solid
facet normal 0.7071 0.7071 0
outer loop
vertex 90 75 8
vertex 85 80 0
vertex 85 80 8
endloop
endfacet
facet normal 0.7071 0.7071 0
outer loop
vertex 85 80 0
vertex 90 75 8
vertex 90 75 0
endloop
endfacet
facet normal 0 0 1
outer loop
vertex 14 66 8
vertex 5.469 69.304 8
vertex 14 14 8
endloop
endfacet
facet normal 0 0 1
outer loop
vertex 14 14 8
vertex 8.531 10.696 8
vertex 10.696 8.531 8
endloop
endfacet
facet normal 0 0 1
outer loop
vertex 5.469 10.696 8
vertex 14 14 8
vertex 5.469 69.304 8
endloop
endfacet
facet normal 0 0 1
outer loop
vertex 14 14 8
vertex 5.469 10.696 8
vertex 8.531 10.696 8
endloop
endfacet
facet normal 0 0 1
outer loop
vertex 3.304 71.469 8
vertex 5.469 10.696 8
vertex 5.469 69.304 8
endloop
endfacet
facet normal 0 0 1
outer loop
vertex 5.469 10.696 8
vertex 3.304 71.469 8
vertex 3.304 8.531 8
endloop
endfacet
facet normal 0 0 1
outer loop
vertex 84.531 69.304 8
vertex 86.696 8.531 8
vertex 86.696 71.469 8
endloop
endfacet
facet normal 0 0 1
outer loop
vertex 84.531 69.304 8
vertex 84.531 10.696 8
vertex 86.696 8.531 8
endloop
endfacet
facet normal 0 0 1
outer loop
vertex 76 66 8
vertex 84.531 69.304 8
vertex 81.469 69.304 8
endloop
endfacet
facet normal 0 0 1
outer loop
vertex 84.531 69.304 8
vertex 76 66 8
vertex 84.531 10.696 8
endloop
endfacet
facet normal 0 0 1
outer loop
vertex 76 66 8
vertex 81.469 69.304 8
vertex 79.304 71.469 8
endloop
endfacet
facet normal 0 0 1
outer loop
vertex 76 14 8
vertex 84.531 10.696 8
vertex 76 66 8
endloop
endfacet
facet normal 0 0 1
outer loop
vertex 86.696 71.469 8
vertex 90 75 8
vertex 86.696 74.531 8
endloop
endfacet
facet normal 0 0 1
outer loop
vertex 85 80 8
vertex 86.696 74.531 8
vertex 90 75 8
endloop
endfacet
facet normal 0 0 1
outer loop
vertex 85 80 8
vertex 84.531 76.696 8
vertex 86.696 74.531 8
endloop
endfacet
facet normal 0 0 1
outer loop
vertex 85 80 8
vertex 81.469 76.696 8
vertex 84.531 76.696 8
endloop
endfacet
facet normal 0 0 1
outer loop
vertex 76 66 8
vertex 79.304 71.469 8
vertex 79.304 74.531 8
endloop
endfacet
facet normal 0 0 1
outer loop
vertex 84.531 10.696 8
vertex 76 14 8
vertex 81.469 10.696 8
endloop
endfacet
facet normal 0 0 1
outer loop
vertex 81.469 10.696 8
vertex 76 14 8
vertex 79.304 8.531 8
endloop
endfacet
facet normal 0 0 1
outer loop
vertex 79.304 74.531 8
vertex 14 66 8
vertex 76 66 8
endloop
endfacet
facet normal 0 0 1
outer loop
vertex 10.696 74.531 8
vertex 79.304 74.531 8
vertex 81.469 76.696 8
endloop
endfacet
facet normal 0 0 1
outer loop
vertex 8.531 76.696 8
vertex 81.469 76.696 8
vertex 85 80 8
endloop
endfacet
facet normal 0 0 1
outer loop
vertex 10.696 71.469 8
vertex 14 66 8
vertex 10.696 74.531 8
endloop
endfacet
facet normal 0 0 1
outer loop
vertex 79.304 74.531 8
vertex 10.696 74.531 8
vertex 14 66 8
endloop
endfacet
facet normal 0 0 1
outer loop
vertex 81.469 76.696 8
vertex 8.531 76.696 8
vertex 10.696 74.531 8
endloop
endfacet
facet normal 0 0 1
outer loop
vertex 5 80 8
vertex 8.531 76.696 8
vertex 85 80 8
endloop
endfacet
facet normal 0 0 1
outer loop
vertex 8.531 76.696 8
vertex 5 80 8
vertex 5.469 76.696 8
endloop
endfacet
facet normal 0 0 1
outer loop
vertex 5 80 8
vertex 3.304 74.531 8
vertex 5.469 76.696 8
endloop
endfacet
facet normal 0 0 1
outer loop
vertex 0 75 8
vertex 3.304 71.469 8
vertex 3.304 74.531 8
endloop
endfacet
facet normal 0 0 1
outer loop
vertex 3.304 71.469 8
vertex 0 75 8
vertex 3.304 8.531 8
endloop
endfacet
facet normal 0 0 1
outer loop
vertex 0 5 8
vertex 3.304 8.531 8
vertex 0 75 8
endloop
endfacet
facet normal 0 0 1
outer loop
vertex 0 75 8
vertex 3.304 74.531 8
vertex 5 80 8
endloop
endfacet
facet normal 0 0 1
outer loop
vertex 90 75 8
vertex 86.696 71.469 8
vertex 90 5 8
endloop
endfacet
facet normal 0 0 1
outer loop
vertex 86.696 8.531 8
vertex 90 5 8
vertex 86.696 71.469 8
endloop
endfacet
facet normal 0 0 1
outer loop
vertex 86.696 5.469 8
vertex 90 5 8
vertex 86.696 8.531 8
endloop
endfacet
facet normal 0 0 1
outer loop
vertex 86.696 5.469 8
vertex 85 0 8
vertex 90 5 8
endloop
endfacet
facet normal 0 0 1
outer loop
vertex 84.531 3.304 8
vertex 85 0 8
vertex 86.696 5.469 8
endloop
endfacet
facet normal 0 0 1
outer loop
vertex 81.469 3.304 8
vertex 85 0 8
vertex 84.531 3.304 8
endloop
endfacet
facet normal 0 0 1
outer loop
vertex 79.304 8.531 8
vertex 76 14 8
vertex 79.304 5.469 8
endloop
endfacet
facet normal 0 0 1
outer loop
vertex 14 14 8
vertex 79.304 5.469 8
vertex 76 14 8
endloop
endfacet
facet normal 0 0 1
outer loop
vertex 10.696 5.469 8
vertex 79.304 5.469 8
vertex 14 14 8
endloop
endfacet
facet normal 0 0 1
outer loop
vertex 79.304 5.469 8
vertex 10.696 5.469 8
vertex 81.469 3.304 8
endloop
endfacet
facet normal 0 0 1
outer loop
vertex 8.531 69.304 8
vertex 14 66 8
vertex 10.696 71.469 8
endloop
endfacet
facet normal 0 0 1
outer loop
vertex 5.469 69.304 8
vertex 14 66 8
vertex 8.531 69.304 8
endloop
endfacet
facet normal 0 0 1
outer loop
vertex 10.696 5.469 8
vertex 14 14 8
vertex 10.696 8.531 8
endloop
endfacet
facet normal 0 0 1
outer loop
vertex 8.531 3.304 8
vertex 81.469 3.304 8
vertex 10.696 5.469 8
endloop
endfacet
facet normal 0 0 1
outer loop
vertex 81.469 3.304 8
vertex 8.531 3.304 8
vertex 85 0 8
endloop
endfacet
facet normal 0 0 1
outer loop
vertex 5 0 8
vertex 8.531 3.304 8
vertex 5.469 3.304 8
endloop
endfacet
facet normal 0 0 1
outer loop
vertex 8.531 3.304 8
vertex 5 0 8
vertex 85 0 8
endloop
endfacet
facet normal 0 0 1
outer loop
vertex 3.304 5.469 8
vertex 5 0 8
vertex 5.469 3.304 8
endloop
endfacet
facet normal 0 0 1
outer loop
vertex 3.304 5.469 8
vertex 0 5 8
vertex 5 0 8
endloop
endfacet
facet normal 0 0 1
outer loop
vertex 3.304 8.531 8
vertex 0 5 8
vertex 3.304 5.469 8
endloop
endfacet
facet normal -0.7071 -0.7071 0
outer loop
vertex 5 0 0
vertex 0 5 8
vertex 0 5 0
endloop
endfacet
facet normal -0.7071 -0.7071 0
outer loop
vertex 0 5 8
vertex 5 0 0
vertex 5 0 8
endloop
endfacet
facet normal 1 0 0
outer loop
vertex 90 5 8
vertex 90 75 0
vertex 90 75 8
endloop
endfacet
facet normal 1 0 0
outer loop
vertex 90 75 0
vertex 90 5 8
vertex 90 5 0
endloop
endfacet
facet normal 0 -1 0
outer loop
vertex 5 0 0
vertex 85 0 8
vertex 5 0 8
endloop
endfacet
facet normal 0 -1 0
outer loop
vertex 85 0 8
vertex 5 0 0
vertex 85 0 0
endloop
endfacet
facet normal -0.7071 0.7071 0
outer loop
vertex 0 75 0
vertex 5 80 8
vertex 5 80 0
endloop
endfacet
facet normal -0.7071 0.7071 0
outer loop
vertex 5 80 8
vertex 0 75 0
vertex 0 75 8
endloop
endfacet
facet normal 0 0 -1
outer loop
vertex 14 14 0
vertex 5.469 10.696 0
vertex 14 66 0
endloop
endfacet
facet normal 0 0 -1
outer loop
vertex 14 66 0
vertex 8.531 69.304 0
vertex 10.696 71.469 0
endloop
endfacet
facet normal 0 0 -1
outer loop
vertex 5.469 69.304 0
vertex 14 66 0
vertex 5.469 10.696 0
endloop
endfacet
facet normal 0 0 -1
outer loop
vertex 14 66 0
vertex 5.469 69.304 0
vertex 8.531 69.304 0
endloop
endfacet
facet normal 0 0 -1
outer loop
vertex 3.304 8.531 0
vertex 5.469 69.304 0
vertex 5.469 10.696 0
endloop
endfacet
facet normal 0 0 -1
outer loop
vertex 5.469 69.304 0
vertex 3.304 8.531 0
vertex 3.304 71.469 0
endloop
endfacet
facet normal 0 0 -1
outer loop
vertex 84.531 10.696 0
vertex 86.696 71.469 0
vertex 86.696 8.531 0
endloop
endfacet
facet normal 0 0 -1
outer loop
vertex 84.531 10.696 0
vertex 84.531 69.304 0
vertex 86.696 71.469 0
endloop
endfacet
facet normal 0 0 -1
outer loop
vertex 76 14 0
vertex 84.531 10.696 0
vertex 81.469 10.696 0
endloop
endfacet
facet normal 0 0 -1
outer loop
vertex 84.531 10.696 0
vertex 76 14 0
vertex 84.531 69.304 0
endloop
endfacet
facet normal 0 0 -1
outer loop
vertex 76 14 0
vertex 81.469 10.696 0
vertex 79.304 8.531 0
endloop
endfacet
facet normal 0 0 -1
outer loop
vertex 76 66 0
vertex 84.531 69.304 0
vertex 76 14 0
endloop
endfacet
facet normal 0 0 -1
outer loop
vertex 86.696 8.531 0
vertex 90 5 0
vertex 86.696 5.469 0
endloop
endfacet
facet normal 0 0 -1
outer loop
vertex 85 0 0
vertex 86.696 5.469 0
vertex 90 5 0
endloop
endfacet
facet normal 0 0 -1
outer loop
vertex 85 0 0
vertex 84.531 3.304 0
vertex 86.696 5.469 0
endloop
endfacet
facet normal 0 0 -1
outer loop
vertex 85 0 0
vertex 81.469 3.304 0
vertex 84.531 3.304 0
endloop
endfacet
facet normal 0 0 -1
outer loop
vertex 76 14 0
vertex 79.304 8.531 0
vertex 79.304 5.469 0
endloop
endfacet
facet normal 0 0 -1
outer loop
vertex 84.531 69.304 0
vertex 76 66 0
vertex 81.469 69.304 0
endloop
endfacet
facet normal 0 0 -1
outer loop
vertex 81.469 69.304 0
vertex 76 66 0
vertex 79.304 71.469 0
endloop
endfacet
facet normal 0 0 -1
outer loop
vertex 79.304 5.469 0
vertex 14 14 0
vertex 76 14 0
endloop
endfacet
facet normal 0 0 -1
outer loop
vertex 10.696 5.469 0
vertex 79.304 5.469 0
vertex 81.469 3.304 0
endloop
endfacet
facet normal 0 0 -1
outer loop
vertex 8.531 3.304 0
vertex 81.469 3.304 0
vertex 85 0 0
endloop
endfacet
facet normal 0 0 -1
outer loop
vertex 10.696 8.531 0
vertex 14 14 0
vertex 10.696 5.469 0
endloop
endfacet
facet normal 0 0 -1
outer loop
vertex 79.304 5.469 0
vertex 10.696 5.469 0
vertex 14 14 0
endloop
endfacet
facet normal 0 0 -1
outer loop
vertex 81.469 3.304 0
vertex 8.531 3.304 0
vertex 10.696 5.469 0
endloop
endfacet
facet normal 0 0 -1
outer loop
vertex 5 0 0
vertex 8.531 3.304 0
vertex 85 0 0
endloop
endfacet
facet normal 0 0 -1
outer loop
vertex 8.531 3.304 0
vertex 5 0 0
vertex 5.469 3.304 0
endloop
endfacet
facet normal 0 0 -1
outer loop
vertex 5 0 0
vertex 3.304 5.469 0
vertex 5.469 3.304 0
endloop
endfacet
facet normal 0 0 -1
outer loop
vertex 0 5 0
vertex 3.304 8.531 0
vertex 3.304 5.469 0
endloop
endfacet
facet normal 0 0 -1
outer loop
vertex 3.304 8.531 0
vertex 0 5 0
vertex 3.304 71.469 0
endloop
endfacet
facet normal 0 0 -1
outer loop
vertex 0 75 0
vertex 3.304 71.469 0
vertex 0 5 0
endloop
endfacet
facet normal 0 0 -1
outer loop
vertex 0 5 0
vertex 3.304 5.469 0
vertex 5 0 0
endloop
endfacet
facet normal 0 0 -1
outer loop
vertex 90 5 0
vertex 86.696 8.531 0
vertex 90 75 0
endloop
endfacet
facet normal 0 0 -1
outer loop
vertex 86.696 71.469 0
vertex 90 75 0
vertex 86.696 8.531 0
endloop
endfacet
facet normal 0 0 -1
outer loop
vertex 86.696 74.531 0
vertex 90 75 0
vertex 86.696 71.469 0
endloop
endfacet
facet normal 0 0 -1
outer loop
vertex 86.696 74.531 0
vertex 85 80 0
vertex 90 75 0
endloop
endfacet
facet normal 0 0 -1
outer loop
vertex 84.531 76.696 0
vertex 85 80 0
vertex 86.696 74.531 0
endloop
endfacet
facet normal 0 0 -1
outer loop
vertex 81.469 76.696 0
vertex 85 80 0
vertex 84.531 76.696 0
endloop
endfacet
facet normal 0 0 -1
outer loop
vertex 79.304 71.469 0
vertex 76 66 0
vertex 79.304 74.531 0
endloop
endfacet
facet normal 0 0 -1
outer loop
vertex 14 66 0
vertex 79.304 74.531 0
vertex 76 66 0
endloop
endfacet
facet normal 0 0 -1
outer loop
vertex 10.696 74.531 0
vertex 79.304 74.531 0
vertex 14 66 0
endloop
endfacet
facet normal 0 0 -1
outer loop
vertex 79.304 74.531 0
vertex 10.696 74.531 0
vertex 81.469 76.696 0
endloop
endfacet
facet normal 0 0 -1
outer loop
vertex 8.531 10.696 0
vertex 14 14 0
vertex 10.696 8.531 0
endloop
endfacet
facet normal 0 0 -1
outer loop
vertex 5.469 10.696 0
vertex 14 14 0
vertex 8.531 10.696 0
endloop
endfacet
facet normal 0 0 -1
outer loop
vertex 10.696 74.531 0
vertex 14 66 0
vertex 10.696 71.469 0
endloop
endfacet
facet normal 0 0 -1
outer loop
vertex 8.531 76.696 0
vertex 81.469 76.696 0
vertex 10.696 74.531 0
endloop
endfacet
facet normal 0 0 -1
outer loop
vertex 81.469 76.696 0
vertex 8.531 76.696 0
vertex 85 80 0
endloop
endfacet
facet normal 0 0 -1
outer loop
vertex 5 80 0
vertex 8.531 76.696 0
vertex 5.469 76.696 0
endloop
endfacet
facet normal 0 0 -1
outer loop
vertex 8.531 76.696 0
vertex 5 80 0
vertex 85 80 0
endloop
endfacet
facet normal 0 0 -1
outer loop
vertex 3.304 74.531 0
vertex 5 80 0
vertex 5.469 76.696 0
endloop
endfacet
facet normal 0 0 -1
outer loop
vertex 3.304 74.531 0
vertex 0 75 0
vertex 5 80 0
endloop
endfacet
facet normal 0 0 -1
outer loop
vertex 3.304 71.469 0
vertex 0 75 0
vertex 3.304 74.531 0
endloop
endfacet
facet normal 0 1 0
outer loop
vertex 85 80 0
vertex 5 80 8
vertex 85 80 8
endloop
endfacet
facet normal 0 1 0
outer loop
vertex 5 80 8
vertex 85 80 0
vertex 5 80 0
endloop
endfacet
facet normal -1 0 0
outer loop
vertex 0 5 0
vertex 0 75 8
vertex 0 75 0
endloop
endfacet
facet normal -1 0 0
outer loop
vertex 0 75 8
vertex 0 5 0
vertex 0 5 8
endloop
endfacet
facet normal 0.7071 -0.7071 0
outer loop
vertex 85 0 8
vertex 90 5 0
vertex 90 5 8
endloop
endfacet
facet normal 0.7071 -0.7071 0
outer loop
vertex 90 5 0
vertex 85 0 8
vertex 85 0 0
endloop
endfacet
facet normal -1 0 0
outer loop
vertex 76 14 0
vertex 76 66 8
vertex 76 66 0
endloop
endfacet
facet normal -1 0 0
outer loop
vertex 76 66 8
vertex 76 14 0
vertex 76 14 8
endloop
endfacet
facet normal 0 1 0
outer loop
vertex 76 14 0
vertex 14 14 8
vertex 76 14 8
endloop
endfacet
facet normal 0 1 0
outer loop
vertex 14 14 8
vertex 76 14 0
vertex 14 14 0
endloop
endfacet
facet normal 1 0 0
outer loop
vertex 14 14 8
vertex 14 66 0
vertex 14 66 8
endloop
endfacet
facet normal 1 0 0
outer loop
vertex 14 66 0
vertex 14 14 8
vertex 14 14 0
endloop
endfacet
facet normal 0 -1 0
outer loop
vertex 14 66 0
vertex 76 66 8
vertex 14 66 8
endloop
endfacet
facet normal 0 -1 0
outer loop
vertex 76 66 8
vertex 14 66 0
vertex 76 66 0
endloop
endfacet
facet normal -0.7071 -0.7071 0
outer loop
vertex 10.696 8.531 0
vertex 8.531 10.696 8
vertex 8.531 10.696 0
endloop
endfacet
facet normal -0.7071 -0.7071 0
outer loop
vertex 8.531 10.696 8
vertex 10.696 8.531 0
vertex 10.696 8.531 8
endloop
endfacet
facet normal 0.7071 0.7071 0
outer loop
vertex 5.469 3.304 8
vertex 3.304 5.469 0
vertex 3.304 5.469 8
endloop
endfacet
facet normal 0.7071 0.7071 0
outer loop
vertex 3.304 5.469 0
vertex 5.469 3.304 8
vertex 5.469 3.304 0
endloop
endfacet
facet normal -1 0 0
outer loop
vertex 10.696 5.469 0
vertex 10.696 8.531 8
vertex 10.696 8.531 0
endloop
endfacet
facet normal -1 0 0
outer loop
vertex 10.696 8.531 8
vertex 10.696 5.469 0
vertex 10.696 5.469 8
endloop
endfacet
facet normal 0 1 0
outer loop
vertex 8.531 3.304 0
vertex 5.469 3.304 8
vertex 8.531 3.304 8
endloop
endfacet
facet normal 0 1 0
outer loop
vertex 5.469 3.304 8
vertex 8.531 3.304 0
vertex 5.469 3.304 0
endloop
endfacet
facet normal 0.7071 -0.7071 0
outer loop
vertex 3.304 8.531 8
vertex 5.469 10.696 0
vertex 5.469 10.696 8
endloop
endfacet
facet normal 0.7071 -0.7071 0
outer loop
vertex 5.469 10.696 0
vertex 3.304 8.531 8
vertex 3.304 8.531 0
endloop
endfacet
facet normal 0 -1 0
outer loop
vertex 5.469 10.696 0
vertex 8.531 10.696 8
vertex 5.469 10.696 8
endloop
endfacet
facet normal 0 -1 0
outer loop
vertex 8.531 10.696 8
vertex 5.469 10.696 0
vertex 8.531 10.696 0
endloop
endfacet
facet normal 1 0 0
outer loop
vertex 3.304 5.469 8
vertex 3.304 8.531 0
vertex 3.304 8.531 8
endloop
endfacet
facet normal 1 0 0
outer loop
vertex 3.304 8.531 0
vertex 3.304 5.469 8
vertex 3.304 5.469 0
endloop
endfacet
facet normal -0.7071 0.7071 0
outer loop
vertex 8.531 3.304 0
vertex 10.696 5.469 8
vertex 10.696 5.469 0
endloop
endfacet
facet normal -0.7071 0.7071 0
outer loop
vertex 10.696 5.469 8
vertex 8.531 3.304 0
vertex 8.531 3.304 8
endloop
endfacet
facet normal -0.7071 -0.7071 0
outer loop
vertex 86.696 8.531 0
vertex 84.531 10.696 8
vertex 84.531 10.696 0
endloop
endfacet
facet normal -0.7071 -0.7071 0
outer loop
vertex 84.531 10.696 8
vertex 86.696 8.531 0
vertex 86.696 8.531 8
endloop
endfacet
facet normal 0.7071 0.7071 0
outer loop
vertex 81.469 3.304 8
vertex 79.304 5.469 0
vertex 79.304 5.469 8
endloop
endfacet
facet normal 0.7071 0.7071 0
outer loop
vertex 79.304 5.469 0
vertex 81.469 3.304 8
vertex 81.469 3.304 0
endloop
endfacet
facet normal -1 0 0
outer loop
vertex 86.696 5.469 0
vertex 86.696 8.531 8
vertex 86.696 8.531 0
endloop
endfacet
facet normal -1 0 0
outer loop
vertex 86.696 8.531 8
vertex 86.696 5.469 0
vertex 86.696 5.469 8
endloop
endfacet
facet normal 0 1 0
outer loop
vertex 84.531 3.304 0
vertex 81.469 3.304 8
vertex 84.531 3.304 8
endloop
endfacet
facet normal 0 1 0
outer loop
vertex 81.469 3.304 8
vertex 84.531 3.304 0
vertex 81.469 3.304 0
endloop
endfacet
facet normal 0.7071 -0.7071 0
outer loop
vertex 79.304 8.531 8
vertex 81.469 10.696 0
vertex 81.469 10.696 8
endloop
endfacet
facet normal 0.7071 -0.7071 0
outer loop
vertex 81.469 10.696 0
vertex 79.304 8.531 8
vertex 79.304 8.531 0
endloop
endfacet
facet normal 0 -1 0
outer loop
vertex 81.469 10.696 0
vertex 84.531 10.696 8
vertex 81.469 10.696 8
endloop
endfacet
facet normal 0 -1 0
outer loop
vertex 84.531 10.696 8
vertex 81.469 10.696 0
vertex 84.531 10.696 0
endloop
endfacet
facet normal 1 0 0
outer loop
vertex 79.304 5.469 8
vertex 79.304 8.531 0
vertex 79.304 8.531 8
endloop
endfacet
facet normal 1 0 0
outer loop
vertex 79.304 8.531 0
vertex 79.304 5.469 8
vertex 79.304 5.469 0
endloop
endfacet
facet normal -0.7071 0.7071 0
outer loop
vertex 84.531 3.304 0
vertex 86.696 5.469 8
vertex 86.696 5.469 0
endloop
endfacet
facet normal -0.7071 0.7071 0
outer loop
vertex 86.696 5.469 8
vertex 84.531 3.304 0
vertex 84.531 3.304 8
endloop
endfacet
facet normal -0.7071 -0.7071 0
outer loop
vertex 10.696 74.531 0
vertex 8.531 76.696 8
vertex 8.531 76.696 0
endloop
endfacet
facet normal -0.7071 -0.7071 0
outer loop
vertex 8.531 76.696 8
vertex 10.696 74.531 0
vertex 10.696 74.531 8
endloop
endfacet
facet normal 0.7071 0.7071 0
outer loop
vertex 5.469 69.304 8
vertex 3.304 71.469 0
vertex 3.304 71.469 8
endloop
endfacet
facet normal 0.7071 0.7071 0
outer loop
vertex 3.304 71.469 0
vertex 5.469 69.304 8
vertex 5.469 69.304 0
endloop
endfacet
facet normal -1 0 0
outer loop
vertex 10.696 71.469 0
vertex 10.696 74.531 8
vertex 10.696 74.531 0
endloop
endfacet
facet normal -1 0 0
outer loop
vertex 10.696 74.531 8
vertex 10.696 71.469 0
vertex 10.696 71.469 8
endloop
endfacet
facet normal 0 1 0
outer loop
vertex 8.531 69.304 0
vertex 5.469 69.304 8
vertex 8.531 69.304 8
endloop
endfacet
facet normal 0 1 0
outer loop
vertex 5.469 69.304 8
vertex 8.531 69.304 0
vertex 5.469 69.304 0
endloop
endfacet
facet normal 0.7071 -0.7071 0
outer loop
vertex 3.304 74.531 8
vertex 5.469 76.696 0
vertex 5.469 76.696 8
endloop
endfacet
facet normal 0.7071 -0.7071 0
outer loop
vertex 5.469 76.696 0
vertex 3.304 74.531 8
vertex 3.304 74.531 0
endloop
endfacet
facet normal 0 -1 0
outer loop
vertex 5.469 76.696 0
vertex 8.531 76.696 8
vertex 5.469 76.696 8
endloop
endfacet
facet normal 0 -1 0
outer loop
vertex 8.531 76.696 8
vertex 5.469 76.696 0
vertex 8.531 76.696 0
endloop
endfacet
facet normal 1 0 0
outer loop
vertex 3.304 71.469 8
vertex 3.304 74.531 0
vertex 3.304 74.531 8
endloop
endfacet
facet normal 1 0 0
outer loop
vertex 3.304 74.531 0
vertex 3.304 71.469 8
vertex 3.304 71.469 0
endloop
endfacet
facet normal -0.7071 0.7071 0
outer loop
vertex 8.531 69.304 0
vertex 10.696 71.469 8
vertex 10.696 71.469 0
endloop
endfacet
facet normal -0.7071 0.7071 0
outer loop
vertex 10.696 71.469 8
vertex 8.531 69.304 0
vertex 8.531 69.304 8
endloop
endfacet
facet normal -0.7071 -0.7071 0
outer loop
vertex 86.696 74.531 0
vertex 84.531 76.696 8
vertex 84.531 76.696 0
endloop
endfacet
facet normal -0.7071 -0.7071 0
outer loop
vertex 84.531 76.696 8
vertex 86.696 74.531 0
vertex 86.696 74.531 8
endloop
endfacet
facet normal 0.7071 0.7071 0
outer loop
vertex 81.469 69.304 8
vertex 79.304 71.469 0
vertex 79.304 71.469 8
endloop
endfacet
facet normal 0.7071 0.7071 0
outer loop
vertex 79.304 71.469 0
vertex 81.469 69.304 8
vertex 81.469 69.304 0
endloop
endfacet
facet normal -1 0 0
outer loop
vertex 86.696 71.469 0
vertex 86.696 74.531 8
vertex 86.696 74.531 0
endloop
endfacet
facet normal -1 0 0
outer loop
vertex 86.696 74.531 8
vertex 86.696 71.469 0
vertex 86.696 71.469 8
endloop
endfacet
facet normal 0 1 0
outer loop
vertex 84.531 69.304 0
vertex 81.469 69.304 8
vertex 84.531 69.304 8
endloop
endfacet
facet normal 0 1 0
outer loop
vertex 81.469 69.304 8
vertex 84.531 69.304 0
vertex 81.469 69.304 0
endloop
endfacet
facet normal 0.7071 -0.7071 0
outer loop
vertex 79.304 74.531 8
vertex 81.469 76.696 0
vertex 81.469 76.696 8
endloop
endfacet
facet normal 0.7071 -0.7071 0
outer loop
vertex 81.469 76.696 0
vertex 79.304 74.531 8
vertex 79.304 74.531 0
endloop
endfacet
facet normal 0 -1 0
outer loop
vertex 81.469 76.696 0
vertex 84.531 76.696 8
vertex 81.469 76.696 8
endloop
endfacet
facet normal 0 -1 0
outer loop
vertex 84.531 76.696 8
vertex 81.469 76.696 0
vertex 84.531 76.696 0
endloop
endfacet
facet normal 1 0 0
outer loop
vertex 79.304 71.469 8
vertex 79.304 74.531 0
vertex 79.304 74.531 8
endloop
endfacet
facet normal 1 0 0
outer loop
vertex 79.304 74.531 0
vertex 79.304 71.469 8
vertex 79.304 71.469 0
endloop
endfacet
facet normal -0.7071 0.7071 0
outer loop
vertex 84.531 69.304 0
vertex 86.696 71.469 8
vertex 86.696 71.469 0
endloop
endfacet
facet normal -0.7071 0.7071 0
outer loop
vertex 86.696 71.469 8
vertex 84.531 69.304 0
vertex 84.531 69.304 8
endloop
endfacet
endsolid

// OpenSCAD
$fn = 32;

// ----------------------------------------------------------------------
// Frame plate: 90 x 80 frame, 14 mm rails
// ----------------------------------------------------------------------

// --- parameters (mm) ---
plate_l = 90;             // plate length, X
plate_w = 80;             // plate width, Y
plate_t = 8;              // plate thickness, Z (extrusion height)
corner_c = 5;             // corner chamfer
frame_bar = 14;           // frame rail width
bolt_r = 4;               // corner bolt window radius
bolt_inset = 7;           // bolt centre inset from the edges

win_l = plate_l - 2 * frame_bar;  // window length
win_w = plate_w - 2 * frame_bar;  // window width
bolt_d = 2 * bolt_r;  // corner hole diameter

profile = [[5, 0], [85, 0], [90, 5], [90, 75], [85, 80], [5, 80], [0, 75], [0, 5]];  // primary outline, 8 points, counter clockwise
void_1 = [[14, 14], [76, 14], [76, 66], [14, 66]];  // the window, 4 points
void_2 = [[10.696, 8.531], [8.531, 10.696], [5.469, 10.696], [3.304, 8.531], [3.304, 5.469], [5.469, 3.304], [8.531, 3.304], [10.696, 5.469]];  // corner bolt window, 8 points
void_3 = [[86.696, 8.531], [84.531, 10.696], [81.469, 10.696], [79.304, 8.531], [79.304, 5.469], [81.469, 3.304], [84.531, 3.304], [86.696, 5.469]];  // corner bolt window, 8 points
void_4 = [[10.696, 74.531], [8.531, 76.696], [5.469, 76.696], [3.304, 74.531], [3.304, 71.469], [5.469, 69.304], [8.531, 69.304], [10.696, 71.469]];  // corner bolt window, 8 points
void_5 = [[86.696, 74.531], [84.531, 76.696], [81.469, 76.696], [79.304, 74.531], [79.304, 71.469], [81.469, 69.304], [84.531, 69.304], [86.696, 71.469]];  // corner bolt window, 8 points

// --- the one profile operation ---
difference() {
  linear_extrude(height = plate_t) polygon(points = profile);
  translate([0, 0, -1])
    linear_extrude(height = plate_t + 2) polygon(points = void_1);
  translate([0, 0, -1])
    linear_extrude(height = plate_t + 2) polygon(points = void_2);
  translate([0, 0, -1])
    linear_extrude(height = plate_t + 2) polygon(points = void_3);
  translate([0, 0, -1])
    linear_extrude(height = plate_t + 2) polygon(points = void_4);
  translate([0, 0, -1])
    linear_extrude(height = plate_t + 2) polygon(points = void_5);
}
